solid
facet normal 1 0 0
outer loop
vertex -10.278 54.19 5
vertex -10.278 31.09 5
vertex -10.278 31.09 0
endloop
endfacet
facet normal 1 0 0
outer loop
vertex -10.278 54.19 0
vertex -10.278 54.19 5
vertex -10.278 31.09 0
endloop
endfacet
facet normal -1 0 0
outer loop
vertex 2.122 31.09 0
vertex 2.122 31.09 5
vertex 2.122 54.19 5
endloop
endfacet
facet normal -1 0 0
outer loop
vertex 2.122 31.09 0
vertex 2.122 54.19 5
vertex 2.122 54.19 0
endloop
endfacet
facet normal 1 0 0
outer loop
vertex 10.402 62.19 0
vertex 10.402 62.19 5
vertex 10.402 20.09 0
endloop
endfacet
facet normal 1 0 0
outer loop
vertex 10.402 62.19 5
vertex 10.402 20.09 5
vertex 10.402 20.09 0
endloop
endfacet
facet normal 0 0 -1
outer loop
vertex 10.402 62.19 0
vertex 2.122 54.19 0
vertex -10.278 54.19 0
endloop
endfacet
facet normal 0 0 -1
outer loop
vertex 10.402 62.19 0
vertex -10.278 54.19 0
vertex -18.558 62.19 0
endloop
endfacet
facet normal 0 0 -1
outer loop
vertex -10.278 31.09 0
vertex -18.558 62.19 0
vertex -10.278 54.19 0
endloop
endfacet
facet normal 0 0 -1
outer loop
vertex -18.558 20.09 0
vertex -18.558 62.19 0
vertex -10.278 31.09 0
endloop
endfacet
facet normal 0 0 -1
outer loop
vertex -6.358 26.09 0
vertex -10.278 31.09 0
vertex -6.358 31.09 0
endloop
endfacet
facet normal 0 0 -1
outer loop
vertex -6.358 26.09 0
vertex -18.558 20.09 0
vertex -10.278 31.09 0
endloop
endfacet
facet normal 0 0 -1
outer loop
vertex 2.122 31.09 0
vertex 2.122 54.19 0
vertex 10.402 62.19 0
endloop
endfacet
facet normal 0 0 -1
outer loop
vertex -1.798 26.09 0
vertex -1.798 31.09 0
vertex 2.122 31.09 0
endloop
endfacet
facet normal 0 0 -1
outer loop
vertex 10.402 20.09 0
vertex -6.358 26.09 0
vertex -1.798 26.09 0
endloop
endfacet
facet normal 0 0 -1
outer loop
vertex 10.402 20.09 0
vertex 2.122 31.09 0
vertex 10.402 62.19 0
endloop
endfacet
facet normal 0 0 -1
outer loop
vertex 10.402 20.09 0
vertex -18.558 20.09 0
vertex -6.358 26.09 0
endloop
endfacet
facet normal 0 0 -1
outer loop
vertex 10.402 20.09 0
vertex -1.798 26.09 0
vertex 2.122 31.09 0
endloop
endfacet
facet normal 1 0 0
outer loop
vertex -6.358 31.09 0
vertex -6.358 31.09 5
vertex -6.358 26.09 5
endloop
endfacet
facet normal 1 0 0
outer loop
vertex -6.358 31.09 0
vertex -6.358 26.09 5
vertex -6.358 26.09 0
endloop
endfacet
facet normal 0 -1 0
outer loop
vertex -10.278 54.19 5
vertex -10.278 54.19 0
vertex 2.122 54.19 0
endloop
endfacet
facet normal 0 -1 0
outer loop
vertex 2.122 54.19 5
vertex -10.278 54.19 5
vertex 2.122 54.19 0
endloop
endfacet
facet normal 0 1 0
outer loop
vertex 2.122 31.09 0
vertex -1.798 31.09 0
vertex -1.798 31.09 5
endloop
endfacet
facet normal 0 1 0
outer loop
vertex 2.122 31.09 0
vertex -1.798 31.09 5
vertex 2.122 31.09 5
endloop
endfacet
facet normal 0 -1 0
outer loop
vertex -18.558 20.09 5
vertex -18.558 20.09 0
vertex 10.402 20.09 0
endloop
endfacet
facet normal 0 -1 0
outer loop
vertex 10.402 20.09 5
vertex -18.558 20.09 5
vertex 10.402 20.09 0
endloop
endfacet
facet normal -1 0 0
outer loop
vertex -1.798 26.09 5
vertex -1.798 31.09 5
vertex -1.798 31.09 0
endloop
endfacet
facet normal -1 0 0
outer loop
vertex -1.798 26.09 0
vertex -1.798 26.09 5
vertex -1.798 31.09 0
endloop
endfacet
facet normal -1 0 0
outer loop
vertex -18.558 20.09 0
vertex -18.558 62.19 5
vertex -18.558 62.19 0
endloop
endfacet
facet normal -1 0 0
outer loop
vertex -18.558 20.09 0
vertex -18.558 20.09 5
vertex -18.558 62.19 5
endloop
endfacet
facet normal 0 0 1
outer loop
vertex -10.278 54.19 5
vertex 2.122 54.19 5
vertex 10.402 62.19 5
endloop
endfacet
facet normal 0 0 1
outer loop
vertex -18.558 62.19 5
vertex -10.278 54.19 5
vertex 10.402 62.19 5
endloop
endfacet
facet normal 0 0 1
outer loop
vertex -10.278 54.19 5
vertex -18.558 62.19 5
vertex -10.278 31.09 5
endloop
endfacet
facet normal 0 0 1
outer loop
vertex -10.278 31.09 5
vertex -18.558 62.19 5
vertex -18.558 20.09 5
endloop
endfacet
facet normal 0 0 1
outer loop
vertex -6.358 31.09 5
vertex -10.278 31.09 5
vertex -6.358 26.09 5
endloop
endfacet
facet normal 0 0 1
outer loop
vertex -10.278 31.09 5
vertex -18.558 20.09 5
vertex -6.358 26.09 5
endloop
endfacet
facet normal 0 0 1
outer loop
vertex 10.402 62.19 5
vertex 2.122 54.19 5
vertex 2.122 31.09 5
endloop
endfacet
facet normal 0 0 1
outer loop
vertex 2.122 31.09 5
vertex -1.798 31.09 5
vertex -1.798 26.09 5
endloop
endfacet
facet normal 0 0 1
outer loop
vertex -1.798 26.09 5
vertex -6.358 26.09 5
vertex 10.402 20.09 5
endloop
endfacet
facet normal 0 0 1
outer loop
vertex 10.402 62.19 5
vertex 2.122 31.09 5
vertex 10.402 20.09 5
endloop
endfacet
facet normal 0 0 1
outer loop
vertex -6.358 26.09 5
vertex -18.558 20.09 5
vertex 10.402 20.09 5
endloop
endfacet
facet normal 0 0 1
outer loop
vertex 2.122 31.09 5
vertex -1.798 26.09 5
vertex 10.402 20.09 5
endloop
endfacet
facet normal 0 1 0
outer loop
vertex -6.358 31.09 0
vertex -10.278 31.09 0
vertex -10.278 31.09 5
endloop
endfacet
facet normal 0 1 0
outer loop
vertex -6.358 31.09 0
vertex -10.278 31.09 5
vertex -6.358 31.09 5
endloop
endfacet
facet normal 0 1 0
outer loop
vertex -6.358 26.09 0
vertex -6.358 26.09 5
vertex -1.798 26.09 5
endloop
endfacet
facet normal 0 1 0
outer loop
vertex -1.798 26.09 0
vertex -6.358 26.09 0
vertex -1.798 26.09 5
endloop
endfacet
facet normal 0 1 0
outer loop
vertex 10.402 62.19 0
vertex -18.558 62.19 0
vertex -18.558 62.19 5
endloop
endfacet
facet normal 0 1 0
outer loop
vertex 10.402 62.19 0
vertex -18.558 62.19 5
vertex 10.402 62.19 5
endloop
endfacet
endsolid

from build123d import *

# Parameters (mm, degrees)
SKETCH1_W           = 28.96
SKETCH1_H           = 11
BOSS_EXTRUDE1_DEPTH = 5
SKETCH2_W           = 8.28
SKETCH2_H           = 5
BOSS_EXTRUDE2_DEPTH = 23.1
SKETCH3_W           = 28.96
SKETCH3_H           = 5
BOSS_EXTRUDE3_DEPTH = 8
SKETCH4_W           = 4.56
SKETCH4_H           = 5
CUT_EXTRUDE1_DEPTH  = 5


with BuildPart() as part:
    # Sketch1 → Boss-Extrude1 (new body)
    with BuildSketch(Plane.XY):
        with Locations((-4.078230088, 25.589734513)):
            Rectangle(SKETCH1_W, SKETCH1_H)
    extrude(amount=BOSS_EXTRUDE1_DEPTH)

    # Sketch2 → Boss-Extrude2 (add)
    with BuildSketch(Plane(origin=(0, 31.089734513, 0), x_dir=(1, 0, 0), z_dir=(0, 1, 0))):
        with Locations((-14.418230088, -2.5)):
            Rectangle(SKETCH2_W, SKETCH2_H)
        with Locations((6.261769912, -2.5)):
            Rectangle(SKETCH2_W, SKETCH2_H)
    extrude(amount=BOSS_EXTRUDE2_DEPTH)

    # Sketch3 → Boss-Extrude3 (add)
    with BuildSketch(Plane(origin=(0, 54.189734513, 0), x_dir=(1, 0, 0), z_dir=(0, 1, 0))):
        with Locations((-4.078230088, -2.5)):
            Rectangle(SKETCH3_W, SKETCH3_H)
    extrude(amount=BOSS_EXTRUDE3_DEPTH)

    # Sketch4 → Cut-Extrude1 (cut)
    with BuildSketch(Plane(origin=(0, 31.089734513, 0), x_dir=(1, 0, 0), z_dir=(0, 1, 0))):
        with Locations((-4.078230088, -2.5)):
            Rectangle(SKETCH4_W, SKETCH4_H)
    extrude(amount=-CUT_EXTRUDE1_DEPTH, mode=Mode.SUBTRACT)


solid = part.part
